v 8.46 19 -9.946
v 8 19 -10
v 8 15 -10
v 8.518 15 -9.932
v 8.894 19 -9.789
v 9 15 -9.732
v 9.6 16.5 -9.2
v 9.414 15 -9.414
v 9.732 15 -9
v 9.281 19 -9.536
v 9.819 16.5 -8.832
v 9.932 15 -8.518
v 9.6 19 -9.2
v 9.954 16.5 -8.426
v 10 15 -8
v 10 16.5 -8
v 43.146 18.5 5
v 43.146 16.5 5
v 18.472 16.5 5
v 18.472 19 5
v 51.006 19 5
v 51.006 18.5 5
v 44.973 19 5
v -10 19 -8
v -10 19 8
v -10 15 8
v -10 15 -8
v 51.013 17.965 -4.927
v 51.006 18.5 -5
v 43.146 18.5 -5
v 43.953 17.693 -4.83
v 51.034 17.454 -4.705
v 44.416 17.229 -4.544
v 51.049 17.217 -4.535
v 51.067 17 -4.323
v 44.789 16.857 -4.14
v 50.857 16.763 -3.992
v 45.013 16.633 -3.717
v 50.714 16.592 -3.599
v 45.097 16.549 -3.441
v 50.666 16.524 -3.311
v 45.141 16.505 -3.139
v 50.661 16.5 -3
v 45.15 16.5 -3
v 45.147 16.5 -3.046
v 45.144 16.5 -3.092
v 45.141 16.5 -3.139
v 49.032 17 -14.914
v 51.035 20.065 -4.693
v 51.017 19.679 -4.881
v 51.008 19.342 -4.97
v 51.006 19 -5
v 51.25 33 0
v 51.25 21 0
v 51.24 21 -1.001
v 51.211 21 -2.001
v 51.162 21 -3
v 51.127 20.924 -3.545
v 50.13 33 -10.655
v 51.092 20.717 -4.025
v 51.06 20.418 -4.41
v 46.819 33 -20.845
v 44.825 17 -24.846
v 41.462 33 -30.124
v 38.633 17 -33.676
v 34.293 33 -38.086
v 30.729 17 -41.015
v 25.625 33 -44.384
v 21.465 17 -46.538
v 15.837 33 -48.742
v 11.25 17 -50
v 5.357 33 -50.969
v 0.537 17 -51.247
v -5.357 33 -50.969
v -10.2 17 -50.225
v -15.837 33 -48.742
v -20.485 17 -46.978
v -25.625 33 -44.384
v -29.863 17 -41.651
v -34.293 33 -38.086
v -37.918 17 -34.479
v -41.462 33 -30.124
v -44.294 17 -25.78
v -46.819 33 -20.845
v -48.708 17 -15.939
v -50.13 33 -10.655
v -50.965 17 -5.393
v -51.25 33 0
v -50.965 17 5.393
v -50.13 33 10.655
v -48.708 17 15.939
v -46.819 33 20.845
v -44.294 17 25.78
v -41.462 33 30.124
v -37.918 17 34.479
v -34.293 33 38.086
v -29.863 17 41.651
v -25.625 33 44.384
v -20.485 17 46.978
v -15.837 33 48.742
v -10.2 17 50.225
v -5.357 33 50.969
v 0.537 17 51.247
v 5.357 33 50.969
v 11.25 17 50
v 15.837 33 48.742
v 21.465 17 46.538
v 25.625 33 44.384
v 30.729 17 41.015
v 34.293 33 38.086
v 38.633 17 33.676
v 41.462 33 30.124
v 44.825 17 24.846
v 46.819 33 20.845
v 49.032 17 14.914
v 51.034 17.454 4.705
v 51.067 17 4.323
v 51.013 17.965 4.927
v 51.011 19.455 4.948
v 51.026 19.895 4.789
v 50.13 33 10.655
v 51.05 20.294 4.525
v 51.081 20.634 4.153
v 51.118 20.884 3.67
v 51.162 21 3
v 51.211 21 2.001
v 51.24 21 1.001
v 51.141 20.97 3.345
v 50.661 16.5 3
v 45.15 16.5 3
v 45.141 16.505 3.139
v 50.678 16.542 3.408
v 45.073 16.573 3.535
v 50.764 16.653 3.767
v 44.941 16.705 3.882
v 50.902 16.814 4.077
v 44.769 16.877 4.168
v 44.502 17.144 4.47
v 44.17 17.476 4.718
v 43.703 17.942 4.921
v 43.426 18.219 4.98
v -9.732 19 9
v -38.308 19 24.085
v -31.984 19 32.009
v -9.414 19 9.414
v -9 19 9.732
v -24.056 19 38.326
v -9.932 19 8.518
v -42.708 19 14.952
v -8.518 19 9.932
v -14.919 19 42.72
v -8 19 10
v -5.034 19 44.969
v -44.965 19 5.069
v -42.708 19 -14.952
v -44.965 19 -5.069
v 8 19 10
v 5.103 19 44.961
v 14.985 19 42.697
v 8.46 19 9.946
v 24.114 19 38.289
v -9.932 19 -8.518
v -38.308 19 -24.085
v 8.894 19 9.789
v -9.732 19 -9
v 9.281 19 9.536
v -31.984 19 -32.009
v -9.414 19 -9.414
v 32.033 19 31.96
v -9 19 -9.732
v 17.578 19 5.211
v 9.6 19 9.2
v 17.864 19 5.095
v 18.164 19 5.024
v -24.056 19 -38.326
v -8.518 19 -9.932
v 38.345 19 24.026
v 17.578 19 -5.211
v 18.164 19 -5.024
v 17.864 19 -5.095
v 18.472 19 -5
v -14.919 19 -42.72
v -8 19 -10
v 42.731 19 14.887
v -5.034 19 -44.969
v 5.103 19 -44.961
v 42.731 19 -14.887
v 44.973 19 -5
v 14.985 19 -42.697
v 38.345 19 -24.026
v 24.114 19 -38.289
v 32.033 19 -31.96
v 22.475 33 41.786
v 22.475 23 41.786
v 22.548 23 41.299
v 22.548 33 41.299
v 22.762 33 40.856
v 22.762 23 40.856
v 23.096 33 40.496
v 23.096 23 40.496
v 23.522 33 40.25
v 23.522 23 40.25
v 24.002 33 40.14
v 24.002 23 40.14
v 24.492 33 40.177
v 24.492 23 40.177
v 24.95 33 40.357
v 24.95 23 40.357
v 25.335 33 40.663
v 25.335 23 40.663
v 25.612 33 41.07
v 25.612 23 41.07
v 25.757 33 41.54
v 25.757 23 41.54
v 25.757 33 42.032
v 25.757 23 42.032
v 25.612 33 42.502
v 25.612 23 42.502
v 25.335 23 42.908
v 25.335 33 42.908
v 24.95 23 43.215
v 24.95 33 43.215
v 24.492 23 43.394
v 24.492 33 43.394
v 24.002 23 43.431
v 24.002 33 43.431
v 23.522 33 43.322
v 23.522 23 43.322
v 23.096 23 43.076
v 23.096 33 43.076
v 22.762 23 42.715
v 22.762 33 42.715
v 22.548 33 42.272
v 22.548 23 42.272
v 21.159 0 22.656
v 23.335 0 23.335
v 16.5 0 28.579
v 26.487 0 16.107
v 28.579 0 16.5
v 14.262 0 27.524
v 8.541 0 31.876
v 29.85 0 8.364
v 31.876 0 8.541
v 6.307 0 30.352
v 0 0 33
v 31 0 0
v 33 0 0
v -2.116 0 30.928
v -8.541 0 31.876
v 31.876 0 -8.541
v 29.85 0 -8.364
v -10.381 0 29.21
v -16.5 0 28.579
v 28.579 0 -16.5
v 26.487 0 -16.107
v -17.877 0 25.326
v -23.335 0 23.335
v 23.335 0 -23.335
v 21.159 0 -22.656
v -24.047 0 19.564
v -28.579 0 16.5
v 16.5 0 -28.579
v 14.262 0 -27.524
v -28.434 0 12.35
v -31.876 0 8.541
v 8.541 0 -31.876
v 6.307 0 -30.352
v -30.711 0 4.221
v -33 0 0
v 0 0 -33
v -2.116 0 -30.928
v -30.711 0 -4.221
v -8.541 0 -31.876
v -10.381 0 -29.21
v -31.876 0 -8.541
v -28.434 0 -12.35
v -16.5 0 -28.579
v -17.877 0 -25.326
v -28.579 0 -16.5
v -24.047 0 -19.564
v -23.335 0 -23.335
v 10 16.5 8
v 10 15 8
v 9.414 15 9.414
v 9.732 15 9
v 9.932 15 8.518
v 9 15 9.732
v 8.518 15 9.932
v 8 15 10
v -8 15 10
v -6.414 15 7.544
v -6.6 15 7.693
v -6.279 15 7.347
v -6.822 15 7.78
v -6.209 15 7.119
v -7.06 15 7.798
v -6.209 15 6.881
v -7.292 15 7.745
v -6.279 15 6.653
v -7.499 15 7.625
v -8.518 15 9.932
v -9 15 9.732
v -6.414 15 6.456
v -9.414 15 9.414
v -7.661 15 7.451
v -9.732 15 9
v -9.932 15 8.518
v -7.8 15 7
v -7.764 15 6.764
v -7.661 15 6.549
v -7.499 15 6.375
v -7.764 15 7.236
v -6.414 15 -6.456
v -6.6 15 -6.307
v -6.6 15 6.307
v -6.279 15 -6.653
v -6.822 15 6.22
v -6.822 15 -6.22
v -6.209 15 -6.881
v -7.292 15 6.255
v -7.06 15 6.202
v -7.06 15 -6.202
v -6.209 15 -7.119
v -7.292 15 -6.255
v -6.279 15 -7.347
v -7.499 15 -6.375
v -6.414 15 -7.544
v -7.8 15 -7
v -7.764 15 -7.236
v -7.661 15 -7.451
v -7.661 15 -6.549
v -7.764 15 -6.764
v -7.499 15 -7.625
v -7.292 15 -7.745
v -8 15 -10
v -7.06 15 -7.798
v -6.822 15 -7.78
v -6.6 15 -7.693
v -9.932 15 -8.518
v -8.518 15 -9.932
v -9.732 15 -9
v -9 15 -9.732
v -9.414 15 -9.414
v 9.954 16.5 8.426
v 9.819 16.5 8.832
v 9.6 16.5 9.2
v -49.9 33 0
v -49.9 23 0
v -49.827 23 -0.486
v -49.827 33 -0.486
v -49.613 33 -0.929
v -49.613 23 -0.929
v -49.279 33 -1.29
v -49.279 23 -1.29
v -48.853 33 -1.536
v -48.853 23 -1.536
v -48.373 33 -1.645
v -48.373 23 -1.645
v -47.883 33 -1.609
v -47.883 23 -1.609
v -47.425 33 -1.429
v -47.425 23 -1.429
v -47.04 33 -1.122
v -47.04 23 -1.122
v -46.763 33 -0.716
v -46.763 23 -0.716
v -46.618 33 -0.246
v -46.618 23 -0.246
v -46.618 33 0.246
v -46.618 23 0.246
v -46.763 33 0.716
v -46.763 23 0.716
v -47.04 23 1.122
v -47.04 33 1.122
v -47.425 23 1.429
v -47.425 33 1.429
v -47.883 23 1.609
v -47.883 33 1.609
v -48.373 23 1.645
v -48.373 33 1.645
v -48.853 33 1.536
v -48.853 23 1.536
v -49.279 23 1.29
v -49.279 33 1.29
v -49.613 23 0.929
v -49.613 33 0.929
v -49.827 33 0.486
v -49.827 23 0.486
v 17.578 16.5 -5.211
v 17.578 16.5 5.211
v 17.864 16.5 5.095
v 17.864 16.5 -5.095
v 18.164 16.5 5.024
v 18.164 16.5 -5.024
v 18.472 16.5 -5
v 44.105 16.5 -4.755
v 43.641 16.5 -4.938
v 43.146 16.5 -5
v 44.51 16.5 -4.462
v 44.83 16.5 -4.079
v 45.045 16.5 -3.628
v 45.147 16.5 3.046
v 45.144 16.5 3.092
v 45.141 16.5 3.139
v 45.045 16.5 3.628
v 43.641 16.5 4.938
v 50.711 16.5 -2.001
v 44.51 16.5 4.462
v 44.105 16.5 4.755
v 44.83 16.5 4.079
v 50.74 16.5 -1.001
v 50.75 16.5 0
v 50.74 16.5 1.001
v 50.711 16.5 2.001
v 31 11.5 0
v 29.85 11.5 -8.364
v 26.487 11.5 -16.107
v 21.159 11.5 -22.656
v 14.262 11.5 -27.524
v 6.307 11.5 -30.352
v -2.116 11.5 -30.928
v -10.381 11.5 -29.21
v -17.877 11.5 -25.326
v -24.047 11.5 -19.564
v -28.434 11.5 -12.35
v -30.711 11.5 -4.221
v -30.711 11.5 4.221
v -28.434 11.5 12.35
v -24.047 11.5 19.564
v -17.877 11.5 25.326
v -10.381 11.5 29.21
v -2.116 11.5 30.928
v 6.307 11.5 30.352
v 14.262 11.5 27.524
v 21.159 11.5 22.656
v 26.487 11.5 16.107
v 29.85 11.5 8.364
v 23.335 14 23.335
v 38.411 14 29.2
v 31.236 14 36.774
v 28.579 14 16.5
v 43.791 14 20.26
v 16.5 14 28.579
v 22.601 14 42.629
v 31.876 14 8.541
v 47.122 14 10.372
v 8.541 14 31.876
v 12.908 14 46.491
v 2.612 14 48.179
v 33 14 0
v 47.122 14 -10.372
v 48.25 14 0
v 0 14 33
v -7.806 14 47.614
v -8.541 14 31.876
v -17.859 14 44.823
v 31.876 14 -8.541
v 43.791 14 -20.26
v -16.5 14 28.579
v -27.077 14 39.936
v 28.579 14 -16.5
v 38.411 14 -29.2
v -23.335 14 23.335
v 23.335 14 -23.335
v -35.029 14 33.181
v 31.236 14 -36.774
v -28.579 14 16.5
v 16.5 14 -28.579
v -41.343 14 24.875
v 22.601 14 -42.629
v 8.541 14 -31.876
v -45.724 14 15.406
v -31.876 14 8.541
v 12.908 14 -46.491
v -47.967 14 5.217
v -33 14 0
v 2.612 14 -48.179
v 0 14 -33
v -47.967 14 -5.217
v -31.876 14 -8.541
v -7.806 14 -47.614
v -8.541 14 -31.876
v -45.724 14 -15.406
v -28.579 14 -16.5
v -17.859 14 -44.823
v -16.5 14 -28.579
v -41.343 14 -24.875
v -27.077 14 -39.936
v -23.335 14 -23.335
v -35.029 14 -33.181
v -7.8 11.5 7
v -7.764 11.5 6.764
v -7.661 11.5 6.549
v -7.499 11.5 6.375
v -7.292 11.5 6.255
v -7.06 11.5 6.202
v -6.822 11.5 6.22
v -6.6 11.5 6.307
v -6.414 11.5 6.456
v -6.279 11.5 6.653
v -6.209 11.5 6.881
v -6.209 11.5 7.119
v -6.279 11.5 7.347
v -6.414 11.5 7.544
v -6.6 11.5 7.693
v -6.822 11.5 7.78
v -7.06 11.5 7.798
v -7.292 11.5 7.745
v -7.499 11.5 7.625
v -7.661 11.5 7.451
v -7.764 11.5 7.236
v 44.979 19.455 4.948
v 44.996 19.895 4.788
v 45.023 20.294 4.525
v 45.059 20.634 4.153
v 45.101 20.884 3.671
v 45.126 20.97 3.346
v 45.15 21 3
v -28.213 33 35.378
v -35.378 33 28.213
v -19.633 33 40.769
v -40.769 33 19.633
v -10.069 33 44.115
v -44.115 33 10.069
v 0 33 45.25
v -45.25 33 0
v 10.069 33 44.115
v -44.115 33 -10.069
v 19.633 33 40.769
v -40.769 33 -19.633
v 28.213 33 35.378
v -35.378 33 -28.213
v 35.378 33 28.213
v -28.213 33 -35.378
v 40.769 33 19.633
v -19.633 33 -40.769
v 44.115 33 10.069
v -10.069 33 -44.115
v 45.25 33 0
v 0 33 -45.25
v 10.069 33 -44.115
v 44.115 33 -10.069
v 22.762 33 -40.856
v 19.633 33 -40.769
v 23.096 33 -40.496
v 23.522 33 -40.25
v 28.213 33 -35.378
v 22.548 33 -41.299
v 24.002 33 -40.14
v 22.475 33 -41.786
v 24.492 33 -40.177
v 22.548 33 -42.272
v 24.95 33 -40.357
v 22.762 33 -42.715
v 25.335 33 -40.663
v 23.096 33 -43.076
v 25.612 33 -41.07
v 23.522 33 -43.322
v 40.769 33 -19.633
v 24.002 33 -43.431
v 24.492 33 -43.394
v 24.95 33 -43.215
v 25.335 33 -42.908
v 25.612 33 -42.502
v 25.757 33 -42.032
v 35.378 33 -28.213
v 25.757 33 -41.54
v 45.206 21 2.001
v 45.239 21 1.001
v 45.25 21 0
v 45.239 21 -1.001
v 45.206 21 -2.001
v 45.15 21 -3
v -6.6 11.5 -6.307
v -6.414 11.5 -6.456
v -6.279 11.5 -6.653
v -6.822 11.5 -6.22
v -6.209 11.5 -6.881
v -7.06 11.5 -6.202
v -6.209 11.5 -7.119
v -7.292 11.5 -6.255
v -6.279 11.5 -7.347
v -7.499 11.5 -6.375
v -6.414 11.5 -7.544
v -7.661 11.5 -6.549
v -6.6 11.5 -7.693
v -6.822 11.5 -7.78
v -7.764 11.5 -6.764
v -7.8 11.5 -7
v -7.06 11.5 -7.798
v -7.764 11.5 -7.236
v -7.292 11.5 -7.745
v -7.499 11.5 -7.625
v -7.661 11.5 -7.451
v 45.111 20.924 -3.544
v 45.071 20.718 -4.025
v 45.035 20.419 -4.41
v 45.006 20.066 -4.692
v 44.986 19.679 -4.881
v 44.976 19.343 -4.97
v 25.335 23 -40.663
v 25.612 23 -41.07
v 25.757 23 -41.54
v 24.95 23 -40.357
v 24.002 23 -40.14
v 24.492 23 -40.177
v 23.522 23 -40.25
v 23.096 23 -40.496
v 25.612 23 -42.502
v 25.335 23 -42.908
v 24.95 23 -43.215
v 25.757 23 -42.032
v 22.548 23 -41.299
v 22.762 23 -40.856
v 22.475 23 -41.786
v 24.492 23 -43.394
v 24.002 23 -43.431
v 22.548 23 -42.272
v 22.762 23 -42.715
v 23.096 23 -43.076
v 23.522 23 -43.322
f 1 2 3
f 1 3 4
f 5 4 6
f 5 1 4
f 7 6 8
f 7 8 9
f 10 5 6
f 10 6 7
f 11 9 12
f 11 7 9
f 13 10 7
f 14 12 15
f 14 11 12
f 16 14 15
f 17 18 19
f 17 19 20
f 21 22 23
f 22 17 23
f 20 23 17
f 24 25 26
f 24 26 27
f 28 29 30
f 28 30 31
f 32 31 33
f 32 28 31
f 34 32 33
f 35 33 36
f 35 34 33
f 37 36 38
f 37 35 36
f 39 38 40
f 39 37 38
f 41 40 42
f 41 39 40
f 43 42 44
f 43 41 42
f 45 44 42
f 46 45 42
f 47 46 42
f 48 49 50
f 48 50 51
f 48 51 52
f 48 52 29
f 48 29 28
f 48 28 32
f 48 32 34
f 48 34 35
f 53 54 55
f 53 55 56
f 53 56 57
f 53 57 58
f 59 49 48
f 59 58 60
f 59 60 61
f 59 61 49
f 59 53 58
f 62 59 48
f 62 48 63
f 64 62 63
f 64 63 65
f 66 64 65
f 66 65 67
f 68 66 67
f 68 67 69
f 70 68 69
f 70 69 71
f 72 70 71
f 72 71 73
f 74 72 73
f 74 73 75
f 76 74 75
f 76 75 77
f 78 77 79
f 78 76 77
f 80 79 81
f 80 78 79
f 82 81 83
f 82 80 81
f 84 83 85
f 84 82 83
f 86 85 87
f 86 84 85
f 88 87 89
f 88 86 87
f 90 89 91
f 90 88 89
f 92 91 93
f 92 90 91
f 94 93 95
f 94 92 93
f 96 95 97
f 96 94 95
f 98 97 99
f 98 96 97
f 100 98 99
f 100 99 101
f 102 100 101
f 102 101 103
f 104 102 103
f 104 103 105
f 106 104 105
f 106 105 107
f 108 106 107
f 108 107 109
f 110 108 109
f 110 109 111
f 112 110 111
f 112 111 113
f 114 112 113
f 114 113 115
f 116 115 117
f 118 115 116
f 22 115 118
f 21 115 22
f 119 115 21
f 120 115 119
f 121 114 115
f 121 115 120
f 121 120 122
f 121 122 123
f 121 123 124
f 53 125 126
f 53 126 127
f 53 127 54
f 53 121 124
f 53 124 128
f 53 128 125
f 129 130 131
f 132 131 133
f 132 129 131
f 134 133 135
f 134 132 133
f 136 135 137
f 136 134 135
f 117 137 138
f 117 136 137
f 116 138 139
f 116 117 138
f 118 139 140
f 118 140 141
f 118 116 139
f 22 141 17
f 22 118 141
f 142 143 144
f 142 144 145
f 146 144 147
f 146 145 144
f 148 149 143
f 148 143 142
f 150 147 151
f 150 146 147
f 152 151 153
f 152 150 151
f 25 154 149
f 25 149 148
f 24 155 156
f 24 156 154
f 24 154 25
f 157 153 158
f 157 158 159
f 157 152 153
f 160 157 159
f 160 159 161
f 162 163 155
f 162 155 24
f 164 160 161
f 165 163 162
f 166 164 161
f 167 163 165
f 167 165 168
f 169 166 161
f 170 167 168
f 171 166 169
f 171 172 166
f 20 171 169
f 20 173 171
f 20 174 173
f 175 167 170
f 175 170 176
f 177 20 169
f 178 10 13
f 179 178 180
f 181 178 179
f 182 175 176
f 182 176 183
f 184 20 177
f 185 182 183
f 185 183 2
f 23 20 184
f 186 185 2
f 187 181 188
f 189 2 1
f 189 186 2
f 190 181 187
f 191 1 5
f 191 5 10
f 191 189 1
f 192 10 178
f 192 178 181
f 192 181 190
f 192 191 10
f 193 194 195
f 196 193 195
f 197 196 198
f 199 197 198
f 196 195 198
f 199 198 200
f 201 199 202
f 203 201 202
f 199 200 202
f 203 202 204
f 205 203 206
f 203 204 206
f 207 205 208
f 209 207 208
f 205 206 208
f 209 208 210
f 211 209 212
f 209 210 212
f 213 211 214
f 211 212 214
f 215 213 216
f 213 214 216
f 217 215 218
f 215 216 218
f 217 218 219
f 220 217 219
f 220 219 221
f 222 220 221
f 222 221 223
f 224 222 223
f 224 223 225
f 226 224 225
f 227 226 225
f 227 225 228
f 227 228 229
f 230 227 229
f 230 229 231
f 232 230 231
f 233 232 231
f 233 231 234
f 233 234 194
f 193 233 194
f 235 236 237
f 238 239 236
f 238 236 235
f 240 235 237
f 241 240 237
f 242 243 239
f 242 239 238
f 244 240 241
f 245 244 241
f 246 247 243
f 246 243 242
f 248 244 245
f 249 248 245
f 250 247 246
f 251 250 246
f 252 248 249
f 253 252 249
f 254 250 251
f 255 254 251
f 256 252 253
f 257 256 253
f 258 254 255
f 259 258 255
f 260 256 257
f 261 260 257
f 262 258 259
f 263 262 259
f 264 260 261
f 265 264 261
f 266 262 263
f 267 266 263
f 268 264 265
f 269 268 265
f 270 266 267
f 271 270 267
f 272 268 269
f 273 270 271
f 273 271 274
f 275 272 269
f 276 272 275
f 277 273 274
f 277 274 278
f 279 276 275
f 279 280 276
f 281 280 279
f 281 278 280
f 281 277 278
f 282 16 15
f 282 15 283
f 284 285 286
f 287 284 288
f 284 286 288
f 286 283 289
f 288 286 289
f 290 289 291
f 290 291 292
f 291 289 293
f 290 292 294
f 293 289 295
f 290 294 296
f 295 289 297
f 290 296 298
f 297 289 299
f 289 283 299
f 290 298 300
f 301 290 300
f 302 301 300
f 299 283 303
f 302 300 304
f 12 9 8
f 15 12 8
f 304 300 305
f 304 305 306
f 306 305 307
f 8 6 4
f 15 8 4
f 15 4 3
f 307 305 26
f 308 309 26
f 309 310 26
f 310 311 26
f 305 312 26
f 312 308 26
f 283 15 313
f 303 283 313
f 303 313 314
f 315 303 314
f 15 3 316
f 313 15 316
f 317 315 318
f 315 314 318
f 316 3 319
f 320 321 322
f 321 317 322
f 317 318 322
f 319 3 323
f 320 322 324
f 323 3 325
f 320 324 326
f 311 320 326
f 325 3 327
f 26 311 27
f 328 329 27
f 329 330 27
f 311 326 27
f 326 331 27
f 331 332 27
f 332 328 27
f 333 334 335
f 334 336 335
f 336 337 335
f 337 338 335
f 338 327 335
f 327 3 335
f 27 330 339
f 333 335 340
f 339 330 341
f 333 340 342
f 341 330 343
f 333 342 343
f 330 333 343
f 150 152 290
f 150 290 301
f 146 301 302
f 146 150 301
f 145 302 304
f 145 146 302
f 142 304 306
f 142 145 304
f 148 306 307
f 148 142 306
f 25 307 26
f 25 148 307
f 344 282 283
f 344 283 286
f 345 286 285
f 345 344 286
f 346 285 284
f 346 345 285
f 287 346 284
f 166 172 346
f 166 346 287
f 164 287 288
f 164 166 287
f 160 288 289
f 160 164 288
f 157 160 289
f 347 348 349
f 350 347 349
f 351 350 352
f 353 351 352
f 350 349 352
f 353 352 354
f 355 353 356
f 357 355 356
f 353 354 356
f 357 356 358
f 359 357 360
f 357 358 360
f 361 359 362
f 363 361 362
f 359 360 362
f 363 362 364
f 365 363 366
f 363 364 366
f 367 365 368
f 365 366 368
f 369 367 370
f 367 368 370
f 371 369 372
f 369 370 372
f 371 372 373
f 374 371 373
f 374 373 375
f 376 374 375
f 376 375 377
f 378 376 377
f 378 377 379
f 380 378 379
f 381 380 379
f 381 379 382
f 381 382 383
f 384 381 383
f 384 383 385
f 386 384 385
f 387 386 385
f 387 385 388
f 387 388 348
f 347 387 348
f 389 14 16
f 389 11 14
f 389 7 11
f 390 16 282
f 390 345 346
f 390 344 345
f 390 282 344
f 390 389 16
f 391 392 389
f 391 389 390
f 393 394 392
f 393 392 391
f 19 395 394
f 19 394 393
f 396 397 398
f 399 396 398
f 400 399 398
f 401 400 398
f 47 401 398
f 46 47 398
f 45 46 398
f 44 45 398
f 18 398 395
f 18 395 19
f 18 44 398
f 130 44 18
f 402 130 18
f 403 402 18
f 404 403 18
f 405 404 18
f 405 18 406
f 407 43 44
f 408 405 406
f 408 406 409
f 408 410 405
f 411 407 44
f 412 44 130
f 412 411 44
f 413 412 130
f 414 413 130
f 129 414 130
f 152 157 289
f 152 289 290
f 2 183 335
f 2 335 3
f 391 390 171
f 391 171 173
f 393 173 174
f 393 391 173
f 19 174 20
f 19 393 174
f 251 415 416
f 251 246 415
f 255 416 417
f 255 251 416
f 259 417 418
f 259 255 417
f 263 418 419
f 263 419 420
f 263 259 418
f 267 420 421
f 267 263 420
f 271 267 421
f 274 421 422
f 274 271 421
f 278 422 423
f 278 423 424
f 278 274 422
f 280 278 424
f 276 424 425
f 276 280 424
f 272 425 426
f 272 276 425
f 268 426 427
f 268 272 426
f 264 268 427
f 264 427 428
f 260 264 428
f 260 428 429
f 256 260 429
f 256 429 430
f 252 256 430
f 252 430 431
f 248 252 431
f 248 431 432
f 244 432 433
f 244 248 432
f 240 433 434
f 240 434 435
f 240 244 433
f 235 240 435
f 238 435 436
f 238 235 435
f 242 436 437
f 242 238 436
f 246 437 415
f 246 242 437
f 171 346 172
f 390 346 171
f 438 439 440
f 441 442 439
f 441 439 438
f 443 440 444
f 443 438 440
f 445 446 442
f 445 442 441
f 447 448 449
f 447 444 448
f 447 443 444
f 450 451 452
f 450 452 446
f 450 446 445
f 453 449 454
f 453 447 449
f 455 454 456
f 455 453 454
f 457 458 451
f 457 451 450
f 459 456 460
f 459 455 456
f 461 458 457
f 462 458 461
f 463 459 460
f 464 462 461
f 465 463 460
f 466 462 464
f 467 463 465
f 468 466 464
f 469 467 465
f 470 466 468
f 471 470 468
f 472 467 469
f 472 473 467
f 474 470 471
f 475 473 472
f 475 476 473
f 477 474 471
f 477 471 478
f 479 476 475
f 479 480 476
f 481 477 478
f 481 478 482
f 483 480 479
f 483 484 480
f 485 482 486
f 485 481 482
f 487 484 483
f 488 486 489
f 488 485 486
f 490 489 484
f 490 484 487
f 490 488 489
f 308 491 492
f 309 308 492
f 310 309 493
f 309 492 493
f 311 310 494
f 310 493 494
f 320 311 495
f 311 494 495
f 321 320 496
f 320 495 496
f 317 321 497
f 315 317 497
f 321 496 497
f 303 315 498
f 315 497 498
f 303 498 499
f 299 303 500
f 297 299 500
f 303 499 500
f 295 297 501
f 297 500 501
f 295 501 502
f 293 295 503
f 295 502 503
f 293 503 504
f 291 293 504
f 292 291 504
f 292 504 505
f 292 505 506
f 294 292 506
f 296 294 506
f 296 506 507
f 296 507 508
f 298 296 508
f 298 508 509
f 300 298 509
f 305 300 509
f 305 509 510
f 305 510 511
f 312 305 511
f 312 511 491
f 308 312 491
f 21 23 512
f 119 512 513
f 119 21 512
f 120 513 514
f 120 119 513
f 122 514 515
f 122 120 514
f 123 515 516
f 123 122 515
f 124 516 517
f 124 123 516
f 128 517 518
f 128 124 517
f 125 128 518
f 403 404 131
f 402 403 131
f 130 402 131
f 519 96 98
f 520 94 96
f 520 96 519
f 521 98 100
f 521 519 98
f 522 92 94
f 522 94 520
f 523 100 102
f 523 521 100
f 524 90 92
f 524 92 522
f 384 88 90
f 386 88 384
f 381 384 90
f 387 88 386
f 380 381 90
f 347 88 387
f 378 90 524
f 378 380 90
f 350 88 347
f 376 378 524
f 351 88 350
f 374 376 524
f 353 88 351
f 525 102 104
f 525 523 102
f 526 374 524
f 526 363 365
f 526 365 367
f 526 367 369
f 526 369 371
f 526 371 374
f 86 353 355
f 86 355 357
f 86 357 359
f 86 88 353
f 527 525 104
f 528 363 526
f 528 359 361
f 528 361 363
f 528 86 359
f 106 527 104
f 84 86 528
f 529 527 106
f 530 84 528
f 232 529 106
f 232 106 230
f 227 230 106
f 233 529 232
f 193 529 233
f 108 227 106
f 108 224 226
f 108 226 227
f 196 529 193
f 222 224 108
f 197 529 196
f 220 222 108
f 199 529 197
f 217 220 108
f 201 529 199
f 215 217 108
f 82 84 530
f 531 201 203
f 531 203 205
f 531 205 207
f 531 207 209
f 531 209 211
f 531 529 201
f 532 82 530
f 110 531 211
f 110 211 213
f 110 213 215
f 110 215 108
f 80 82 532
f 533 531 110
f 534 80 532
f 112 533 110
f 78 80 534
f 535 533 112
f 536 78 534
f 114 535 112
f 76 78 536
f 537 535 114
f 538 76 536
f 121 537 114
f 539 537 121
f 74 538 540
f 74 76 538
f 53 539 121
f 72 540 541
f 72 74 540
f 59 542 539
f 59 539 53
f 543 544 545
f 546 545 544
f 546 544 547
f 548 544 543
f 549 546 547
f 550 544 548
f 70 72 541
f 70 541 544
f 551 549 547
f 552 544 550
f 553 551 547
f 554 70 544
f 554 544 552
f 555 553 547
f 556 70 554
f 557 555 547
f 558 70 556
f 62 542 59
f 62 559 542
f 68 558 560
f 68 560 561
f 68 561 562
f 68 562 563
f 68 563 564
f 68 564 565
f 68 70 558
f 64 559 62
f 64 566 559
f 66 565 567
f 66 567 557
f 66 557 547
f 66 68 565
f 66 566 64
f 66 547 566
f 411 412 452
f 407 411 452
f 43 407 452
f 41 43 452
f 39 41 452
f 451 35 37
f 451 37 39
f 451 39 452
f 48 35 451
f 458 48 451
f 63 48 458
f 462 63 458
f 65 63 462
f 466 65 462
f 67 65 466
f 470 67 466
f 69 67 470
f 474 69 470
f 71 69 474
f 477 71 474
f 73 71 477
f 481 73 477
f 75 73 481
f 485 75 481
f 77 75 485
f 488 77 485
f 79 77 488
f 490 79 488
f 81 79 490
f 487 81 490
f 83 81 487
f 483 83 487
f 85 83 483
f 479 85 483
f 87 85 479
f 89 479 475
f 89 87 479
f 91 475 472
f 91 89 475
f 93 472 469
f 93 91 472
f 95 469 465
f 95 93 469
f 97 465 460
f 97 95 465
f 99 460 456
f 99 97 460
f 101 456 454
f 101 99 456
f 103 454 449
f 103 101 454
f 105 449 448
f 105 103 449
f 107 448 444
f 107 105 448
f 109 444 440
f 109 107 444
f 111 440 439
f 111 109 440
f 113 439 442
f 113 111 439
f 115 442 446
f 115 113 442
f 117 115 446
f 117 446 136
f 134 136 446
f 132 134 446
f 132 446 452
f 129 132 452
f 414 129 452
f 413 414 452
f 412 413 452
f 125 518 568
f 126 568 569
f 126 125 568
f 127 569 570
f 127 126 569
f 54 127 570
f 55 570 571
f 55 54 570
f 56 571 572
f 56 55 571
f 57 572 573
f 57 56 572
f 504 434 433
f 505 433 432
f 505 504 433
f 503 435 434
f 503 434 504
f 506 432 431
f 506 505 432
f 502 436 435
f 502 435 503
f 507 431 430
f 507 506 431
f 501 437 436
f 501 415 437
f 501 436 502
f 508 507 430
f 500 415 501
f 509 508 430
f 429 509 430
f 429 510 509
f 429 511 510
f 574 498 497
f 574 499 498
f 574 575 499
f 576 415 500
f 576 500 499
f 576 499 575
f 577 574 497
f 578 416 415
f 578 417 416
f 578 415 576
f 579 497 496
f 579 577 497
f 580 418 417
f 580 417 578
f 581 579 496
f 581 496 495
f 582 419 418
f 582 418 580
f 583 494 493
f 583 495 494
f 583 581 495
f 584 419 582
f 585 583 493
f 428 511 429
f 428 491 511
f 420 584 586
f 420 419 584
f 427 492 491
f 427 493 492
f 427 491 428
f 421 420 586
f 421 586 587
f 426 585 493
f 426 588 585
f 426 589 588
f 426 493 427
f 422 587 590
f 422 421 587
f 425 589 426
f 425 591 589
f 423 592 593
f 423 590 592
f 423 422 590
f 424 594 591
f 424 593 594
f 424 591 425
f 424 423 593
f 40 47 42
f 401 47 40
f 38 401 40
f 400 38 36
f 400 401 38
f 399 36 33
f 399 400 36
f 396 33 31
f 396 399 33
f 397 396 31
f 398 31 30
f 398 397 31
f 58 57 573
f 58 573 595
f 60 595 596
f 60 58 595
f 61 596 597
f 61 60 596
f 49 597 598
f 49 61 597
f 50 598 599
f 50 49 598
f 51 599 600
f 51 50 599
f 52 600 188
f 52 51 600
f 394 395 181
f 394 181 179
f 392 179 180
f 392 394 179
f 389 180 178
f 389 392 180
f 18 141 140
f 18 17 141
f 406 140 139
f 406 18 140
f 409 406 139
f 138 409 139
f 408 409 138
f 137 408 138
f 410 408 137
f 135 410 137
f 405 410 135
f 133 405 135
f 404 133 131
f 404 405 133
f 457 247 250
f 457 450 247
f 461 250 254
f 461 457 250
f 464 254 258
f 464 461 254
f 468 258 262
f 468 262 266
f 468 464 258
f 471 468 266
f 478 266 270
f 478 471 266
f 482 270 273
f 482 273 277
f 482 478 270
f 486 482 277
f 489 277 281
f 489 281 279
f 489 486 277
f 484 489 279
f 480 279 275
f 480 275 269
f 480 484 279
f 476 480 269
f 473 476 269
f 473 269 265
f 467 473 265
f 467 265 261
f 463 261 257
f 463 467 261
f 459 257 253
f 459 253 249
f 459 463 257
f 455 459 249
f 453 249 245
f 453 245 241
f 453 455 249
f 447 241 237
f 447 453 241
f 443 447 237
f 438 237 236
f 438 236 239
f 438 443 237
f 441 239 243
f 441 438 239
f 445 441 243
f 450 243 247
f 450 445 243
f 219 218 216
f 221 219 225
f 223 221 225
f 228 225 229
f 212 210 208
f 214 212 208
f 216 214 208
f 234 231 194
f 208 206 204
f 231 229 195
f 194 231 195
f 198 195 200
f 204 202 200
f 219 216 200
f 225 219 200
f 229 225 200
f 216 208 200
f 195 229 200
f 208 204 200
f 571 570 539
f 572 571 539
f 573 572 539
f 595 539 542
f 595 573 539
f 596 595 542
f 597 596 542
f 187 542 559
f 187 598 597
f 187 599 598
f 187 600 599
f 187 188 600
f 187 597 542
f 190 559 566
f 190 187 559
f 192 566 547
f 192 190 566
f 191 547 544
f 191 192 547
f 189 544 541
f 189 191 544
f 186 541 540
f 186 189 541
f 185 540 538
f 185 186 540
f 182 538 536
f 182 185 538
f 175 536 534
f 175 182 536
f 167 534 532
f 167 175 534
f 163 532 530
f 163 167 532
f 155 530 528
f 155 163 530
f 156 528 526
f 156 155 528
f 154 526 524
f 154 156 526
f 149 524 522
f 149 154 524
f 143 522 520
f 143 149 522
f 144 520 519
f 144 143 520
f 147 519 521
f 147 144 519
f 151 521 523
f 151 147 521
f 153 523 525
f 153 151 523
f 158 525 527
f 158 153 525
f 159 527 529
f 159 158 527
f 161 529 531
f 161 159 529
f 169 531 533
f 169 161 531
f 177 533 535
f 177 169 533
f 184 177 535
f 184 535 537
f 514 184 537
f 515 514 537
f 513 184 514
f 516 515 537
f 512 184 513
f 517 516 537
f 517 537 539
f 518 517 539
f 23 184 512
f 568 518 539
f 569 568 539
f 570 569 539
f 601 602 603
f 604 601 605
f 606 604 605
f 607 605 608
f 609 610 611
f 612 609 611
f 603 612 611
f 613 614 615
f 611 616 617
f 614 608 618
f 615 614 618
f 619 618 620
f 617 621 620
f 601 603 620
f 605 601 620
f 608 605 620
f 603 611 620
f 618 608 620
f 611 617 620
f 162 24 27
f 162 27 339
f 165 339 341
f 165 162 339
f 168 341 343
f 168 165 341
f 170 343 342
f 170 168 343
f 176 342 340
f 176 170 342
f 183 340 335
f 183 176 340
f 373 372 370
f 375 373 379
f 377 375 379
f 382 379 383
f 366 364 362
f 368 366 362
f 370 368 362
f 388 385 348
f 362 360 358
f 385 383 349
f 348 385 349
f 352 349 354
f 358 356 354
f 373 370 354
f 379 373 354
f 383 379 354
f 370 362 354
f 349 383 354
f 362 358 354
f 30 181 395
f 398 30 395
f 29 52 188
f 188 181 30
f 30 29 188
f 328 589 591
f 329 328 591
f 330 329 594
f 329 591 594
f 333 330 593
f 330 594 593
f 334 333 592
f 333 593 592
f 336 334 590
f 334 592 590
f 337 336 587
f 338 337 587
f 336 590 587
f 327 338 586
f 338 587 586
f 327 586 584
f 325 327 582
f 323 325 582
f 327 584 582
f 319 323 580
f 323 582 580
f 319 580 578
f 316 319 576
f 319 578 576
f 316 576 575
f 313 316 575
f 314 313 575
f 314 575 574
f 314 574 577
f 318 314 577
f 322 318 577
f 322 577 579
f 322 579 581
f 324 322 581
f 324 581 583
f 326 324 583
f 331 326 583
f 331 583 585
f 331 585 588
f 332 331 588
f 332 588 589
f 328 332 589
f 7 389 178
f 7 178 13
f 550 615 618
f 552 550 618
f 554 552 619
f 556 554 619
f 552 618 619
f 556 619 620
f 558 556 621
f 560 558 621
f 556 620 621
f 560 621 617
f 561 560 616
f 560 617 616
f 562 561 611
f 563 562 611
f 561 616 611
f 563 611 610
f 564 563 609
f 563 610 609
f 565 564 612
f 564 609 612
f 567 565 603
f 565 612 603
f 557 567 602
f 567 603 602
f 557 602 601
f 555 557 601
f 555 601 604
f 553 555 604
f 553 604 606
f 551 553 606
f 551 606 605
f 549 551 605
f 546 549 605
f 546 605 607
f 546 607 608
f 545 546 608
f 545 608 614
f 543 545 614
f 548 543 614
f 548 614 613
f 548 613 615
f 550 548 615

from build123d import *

# Parameters (mm, degrees)
TROU_POUR_TARAUDAGE_POUR_TROU_TARAUD_M4_D     = 3.3
TROU_POUR_TARAUDAGE_POUR_TROU_TARAUD_M4_DEPTH = 10
CHANFREIN1_SIZE                               = 3
ENL_V_MAT_EXTRU_1_DEPTH                       = 4
ENL_V_START                                   = -2.5
ENL_V_MAT_EXTRU_2_DEPTH                       = 2.5
TROU_POUR_TARAUDAGE_POUR_TROU_TARAUD_M2_D     = 1.6
ENL_V_MAT_EXTRU_3_REACH                       = 121.255


with BuildPart() as part:
    # Esquisse1 → Révolution1 (revolve)
    with BuildSketch(Plane.XY):
        Polygon((0, 11.5), (31, 11.5), (31, 0), (33, 0), (33, 14), (51.25, 14), (51.25, 33), (45.25, 33), (45.25, 19), (0, 19), align=None)
    revolve(axis=Axis((0, 0, 0), (0, 1, 0)))

    # Trou pour taraudage pour trou taraudé M41
    with Locations(Plane(origin=(0, 33, 0), x_dir=(1, 0, 0), z_dir=(0, 1, 0))):
        with Locations((-48.25, 0), (24.125, 41.785725733), (24.125, -41.785725733)):
            Hole(TROU_POUR_TARAUDAGE_POUR_TROU_TARAUD_M4_D / 2, depth=TROU_POUR_TARAUDAGE_POUR_TROU_TARAUD_M4_DEPTH)

    # Chanfrein1
    chanfrein1_edges = [part.edges().sort_by_distance(p)[0] for p in [
        (-51.25, 14, 0),
    ]]
    chamfer(chanfrein1_edges, length=CHANFREIN1_SIZE)

    # Esquisse4 → Enlèv. mat.-Extru.1 (cut)
    with BuildSketch(Plane(origin=(0, 19, 0), x_dir=(1, 0, 0), z_dir=(0, 1, 0))):
        with BuildLine():
            Line((-8, 10), (8, 10))
            ThreePointArc((8, 10), (9.414213562, 9.414213562), (10, 8))
            Line((10, 8), (10, -8))
            ThreePointArc((10, -8), (9.414213562, -9.414213562), (8, -10))
            Line((8, -10), (-8, -10))
            ThreePointArc((-8, -10), (-9.414213562, -9.414213562), (-10, -8))
            Line((-10, -8), (-10, 8))
            ThreePointArc((-10, 8), (-9.414213562, 9.414213562), (-8, 10))
        make_face()
    extrude(amount=-ENL_V_MAT_EXTRU_1_DEPTH, mode=Mode.SUBTRACT)

    # Esquisse5 → Enlèv. mat.-Extru.2 (cut)
    with BuildSketch(Plane(origin=(0, 19, 0), x_dir=(1, 0, 0), z_dir=(0, 1, 0)).offset(ENL_V_START)):
        with BuildLine():
            Line((8, -10), (17.577708764, -5.211145618))
            ThreePointArc((17.577708764, -5.211145618), (18.012630114, -5.053502021), (18.472135955, -5))
            Line((18.472135955, -5), (43.145828304, -5))
            ThreePointArc((43.145828304, -5), (44.510112613, -4.462439169), (45.141011115, -3.138728324))
            ThreePointArc((45.141011115, -3.138728324), (45.25, 0), (45.141011115, 3.138728324))
            ThreePointArc((45.141011115, 3.138728324), (44.510112613, 4.462439169), (43.145828304, 5))
            Line((43.145828304, 5), (18.472135955, 5))
            ThreePointArc((18.472135955, 5), (18.012630114, 5.053502021), (17.577708764, 5.211145618))
            Line((17.577708764, 5.211145618), (8, 10))
            Line((8, 10), (8, -10))
        make_face()
    extrude(amount=ENL_V_MAT_EXTRU_2_DEPTH, mode=Mode.SUBTRACT)

    # Trou pour taraudage pour trou taraudé M21 (through all)
    with Locations(Plane(origin=(0, 15, 0), x_dir=(1, 0, 0), z_dir=(0, 1, 0))):
        with Locations((-7, 7), (-7, -7)):
            Hole(TROU_POUR_TARAUDAGE_POUR_TROU_TARAUD_M2_D / 2)

    # Esquisse8 → Enlèv. mat.-Extru.3 (cut, up to next)
    with BuildSketch(Plane(origin=(51.25, 0, 0), x_dir=(0, 0, -1), z_dir=(1, 0, 0)), mode=Mode.PRIVATE) as enl_v_mat_extru_3_sk1:
        with BuildLine():
            Line((-3, 21), (3, 21))
            ThreePointArc((3, 21), (4.414213562, 20.414213562), (5, 19))
            Line((5, 19), (5, 18.5))
            ThreePointArc((5, 18.5), (4.414213562, 17.085786438), (3, 16.5))
            Line((3, 16.5), (-3, 16.5))
            ThreePointArc((-3, 16.5), (-4.414213562, 17.085786438), (-5, 18.5))
            Line((-5, 18.5), (-5, 19))
            ThreePointArc((-5, 19), (-4.414213562, 20.414213562), (-3, 21))
        make_face()
    enl_v_mat_extru_3_tool1 = extrude(enl_v_mat_extru_3_sk1.sketch, amount=-ENL_V_MAT_EXTRU_3_REACH, mode=Mode.PRIVATE) & part.part
    add(enl_v_mat_extru_3_tool1.solids().sort_by_distance((51.25, 18.75, 0))[0], mode=Mode.SUBTRACT)


solid = part.part
